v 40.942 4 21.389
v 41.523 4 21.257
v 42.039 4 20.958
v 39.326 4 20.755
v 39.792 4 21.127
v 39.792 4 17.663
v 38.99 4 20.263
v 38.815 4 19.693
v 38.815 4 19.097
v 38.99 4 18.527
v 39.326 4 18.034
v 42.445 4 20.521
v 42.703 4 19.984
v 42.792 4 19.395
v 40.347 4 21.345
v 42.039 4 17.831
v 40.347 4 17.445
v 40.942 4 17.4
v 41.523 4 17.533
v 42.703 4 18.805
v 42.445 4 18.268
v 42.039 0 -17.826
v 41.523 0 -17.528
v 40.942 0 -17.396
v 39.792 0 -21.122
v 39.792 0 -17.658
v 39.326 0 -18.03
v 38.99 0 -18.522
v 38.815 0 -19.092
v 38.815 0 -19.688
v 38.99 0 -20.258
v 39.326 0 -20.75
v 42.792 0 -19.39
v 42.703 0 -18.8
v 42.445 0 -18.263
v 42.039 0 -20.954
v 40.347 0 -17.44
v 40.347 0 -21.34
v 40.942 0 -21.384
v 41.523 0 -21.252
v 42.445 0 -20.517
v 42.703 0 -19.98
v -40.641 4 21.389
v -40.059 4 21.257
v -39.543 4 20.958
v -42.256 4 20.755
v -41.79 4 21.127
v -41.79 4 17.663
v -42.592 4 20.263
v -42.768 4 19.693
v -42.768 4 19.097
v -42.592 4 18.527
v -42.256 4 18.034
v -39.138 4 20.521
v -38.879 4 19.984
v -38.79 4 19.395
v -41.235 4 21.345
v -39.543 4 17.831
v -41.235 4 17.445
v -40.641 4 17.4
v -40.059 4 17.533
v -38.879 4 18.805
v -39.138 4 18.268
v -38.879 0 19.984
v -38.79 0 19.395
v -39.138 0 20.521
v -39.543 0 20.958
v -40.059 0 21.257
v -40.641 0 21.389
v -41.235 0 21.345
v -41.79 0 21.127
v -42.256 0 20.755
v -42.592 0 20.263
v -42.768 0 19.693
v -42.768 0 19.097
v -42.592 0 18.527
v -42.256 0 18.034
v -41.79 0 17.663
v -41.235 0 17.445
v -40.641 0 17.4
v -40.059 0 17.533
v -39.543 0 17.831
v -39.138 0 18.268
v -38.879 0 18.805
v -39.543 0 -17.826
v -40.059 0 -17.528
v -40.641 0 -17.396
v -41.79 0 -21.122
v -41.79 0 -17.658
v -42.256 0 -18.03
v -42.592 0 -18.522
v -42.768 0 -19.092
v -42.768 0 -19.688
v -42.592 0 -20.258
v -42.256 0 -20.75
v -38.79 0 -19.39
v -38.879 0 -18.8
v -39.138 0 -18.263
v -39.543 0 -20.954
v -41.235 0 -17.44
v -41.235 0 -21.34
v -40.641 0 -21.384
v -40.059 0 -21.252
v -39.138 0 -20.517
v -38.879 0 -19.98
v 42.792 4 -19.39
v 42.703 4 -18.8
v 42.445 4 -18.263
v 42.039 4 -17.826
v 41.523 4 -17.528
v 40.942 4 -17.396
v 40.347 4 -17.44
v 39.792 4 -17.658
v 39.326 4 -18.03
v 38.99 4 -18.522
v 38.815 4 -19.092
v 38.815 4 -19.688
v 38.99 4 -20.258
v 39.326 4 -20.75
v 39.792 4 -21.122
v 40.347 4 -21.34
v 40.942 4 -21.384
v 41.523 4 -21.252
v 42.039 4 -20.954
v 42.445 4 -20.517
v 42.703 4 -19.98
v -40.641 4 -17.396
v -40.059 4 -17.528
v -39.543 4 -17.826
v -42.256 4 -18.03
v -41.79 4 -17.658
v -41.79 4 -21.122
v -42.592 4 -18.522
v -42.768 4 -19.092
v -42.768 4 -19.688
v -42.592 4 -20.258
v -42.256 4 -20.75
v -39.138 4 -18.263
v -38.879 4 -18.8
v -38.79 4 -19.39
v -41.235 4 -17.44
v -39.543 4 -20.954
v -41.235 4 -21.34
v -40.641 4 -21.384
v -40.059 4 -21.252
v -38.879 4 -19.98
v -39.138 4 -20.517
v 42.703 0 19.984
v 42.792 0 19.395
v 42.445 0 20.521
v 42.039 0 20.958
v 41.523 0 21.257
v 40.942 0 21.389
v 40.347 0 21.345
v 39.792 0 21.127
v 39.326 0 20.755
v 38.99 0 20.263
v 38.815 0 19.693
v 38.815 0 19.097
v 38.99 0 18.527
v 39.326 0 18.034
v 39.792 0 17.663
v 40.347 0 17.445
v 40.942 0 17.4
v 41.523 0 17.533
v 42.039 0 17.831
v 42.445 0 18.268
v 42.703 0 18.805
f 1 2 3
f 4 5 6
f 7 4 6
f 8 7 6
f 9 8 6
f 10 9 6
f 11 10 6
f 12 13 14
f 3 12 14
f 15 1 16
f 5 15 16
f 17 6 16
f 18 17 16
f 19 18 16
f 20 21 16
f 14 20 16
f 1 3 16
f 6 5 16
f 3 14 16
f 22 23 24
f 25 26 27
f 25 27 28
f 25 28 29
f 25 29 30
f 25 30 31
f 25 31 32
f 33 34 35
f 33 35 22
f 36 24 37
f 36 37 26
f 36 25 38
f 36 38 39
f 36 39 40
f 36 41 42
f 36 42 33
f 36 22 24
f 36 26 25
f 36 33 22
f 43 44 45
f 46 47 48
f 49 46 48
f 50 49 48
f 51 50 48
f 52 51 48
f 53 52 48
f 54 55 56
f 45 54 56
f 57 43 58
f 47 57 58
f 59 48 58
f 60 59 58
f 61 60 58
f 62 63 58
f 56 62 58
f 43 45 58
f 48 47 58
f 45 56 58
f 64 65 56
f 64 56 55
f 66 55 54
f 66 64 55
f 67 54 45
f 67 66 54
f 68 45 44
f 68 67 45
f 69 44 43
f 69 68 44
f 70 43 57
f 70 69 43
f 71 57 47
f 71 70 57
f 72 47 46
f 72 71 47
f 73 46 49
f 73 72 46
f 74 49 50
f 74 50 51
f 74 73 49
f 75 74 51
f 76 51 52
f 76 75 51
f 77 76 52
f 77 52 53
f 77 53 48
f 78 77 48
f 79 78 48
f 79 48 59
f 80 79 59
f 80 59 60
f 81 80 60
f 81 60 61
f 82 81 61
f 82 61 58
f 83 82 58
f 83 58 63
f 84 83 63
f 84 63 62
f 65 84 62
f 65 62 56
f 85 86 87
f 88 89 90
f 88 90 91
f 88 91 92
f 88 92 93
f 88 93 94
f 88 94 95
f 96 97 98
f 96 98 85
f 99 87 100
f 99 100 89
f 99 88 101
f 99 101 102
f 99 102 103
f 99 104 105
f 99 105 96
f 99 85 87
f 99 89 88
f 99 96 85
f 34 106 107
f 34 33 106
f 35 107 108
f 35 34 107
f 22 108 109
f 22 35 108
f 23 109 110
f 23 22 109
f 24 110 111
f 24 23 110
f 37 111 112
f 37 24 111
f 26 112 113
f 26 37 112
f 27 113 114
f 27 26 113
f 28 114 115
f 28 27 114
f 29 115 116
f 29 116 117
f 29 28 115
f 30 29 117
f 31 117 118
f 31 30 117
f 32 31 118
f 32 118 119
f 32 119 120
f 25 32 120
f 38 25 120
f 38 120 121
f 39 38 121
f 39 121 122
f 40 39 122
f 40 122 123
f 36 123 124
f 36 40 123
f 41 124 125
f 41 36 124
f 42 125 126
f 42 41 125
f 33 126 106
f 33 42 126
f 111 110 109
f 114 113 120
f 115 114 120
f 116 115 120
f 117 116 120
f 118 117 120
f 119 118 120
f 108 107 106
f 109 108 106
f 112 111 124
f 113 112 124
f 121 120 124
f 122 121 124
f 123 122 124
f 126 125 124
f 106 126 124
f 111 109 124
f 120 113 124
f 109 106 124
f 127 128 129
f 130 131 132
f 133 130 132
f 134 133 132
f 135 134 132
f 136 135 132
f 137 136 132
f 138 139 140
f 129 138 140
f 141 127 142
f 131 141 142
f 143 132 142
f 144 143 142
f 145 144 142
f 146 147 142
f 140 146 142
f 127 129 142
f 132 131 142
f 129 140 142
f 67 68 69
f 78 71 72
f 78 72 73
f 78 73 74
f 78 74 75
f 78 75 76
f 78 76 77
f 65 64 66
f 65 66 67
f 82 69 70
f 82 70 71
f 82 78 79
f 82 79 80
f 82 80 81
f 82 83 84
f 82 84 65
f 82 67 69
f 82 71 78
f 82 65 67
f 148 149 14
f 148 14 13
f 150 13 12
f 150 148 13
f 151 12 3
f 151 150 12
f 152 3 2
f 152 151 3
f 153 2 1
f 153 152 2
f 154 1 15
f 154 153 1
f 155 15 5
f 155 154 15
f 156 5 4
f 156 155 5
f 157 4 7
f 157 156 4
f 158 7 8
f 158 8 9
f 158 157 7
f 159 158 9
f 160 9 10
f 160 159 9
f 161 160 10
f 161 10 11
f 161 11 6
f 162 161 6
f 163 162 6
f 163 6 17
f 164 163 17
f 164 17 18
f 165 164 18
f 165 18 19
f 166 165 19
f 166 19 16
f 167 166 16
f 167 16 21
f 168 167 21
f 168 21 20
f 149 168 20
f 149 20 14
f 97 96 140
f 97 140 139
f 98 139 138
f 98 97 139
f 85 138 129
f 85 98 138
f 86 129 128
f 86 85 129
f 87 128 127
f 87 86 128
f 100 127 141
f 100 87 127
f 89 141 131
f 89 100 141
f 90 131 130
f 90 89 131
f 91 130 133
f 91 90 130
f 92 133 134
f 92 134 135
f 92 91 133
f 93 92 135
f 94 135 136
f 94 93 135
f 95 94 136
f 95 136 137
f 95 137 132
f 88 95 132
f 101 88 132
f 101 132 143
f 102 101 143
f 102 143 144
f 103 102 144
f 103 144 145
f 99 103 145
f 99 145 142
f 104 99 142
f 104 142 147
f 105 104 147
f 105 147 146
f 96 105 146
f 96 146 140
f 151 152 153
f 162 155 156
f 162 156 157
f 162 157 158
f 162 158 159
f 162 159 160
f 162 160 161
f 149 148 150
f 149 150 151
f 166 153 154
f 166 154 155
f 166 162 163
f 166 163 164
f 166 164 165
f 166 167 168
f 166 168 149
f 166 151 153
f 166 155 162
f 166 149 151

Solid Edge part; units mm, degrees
sketch "Sketch1" plane through (0, 0, 0) normal (0, -1, 0) x (1, 0, 0)
  circle A0 centre (-40.79, -19.39) radius 2
  circle A1 centre (40.7922, -19.39) radius 2
  circle A2 centre (40.7922, 19.3948) radius 2
  circle A3 centre (-40.79, 19.3948) radius 2
  dimension "D1" = 40.7922
  dimension "D2" = 40.79
  dimension "D3" = 19.39
  dimension "D4" = 19.39
  dimension "D5" = 19.3948
  dimension "D6" = 19.3948
extrude "Protrusion1" add sketch "Sketch1" against normal blind 4
